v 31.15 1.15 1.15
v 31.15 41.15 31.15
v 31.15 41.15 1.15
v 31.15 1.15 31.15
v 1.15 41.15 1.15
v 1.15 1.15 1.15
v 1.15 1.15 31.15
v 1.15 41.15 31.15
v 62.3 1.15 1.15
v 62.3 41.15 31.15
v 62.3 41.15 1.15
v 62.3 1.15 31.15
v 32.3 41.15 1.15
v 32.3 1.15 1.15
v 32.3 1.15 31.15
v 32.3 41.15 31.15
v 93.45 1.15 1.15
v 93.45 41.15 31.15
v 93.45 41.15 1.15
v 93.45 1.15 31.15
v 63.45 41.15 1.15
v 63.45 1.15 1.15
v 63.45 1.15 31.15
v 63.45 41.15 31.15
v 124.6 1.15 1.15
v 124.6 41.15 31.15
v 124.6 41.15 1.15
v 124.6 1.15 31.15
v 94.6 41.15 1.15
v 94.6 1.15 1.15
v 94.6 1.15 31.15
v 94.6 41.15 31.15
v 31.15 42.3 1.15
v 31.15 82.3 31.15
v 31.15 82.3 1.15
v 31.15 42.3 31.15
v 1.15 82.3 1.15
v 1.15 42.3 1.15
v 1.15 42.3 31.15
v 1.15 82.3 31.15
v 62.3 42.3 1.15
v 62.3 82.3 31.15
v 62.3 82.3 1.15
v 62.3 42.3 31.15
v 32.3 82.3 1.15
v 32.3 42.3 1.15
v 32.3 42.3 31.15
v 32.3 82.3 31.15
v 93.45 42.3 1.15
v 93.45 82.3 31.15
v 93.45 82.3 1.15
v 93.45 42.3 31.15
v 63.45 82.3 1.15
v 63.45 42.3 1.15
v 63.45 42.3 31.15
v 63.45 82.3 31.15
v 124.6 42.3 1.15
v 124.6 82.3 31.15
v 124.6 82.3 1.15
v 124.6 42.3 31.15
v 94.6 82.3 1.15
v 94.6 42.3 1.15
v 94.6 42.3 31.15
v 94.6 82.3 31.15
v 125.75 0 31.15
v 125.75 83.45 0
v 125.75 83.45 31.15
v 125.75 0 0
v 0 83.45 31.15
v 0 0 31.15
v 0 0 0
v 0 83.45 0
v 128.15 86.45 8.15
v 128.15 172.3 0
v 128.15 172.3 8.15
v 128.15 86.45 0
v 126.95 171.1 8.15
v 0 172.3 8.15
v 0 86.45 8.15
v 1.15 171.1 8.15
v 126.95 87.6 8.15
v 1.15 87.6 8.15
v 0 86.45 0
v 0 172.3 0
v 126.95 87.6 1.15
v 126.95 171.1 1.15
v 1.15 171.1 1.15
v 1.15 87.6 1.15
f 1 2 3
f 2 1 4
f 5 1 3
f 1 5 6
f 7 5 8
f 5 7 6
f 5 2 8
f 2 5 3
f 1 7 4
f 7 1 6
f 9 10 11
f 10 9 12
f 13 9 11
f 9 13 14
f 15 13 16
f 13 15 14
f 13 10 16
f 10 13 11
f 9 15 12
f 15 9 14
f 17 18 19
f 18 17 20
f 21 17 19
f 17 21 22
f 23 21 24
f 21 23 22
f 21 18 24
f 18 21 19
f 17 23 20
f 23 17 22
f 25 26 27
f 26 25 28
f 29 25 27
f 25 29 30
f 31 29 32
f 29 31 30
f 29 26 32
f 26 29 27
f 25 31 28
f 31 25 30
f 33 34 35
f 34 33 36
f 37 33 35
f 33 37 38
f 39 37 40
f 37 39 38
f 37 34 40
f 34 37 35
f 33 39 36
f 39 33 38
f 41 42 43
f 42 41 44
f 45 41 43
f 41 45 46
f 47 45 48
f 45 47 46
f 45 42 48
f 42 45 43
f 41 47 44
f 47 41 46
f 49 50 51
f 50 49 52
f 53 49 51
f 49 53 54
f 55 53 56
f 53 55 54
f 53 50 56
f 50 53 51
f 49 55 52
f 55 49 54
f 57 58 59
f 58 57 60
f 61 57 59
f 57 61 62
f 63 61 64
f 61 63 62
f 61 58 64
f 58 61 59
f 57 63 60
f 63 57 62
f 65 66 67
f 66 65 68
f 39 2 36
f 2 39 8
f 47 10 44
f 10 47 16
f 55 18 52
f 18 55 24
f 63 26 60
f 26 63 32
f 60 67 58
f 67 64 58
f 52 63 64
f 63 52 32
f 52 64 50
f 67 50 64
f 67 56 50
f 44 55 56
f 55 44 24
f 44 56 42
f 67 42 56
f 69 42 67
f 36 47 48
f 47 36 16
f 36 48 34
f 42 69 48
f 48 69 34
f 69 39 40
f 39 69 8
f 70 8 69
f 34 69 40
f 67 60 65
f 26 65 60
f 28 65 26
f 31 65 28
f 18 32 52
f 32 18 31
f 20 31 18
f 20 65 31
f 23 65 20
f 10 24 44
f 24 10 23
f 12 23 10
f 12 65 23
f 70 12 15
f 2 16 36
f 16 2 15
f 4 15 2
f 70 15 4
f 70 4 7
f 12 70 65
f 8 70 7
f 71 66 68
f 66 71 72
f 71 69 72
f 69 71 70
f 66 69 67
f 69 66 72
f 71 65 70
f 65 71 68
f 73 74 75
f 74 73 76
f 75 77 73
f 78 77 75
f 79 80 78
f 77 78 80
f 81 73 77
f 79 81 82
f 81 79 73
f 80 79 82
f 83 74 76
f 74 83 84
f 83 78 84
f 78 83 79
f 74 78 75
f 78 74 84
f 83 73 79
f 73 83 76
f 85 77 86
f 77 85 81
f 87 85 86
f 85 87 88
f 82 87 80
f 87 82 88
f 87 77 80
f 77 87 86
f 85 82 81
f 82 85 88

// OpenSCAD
/* [Global] */


// Whether or not to generate the box
generate_box="yes";//[yes, no]

// Whether or not to generate the lid
generate_lid="yes";//[yes, no]

showlid = generate_lid=="yes"? true : false;

showbox = generate_box=="yes"? true : false;

Type_of_Lid = "Standard";//[Standard, Sliding]

lidtype = Type_of_Lid == "Standard"? 0 : 1;	// 0=Flat lid.  Use "1" for lid that slides off in the x direction


// Size of compartments, X
compx = 30;	


// Size of compartments, Y
compy = 40;	


// Width of wall, Make slightly larger then n*nozzle diameter. i.e. 1.15 for a 0.5 nozzle, should give a 2-pass thick wall
wall = 1.15;


// Number of compartments, X
nox = 4;


// Number of compartments, Y
noy = 2;



// Depth of compartments
deep = 30;	







// Tolerance around lid.  If it's too tight, increase this. If it's too loose, decrease it. 0.15 recommended for sliding lid
tolerance=.05;



// This is how far away from the box to print the lid
lidoffset=3;		


// How far the lid goes down the sides of the box. Only applies to Standard lid
lid_drop=7;
lidheight=lid_drop+wall;

//Adds a divit to sliding lid to make opening easer, no effect on standard lid
Thumb_Divit="yes"; //[yes, no]

includethumbhole = Thumb_Divit =="no"? false : true;


//Add a coin slot above every compartment
Coin_Slot="no"; //[yes, no]

includecoinslot=Coin_Slot == "no"? false: true;


//Size of Coin slot in X direction, default is slot thickness for United States Coins. Reverse X and Y to swap direction of slot
coinx=2.5;	
//Size of Coin slot in Y direction, default is slot width for United States Coins. Reverse X and Y to swap direction of slot
coiny=26;	



/* [Hidden] */

				// Z tolerance can be tweaked separately, to make the top of the sliding lid
				// be flush with the top of the box itself.  Default is zero.  Warning: this also
				// adds wiggle room to the lid.
                //Hidden from customizer, because more likely to mess up the box then help it.
ztolerance=0;

////////////////////
//start of objects
////////////////////

totalheight = deep + (lidtype*wall);
thumbrad = min(20,noy*(compy+wall)/3);

if (showbox) {
difference() {
	cube ( size = [nox * (compx + wall) + wall, noy * (compy + wall) + wall, (totalheight + wall)], center = false);


	for ( ybox = [ 0 : noy - 1])
		{
             for( xbox = [ 0 : nox - 1])
			{
			translate([ xbox * ( compx + wall ) + wall, ybox * ( compy + wall ) + wall, wall])
			cube ( size = [ compx, compy, totalheight+1 ]);
			}
		}
	if (lidtype==1) {
			translate ([0,wall/2,deep+wall]) 
			polyhedron ( points = [   
							[0,0,0], 
							[0,noy*(compy+wall),0], 
							[nox*(compx+wall)+wall/2,0,0], 
							[nox*(compx+wall)+wall/2,noy*(compy+wall),0],
							[0,wall/2,wall], 
							[0,noy*(compy+wall)-wall/2,wall], 
							[nox*(compx+wall)+wall/2,wall/2,wall], 
							[nox*(compx+wall)+wall/2,noy*(compy+wall)-wall/2,wall]
							],
						faces = [ 
							[0,2,1], [1,2,3], [4,5,6], [5,7,6]	,		// top and bottom
							[0,4,2], [4,6,2], [5,3,7], [5,1,3]	,		// angled sides
							[0,1,4], [1,5,4], [2,6,3], [3,6,7]			// trapezoidal ends
							]);
			translate ([0,wall/2,deep+wall-ztolerance])
			cube (size=[nox*(compx+wall)+wall/2,noy*(compy+wall),ztolerance],center=false);
			}

	}
}

if (showlid) {
translate ([0,noy*(compy+wall)+wall+lidoffset,0])
difference () { union () {	// for including coin slot
	if (lidtype==1) { 
		difference () {
		polyhedron ( points = [   
						[0,0,0], 
						[0,noy*(compy+wall)-2*tolerance,0], 
						[nox*(compx+wall)-tolerance+wall/2,0,0], 
						[nox*(compx+wall)-tolerance+wall/2,noy*(compy+wall)-2*tolerance,0],
						[0,wall/2,wall], 
						[0,noy*(compy+wall)-wall/2-2*tolerance,wall], 
						[nox*(compx+wall)-tolerance+wall/2,wall/2,wall], 
						[nox*(compx+wall)-tolerance+wall/2,noy*(compy+wall)-wall/2-2*tolerance,wall]
						],
					faces = [ 
						[0,2,1], [1,2,3], [4,5,6], [5,7,6]	,		// top and bottom
						[0,4,2], [4,6,2], [5,3,7], [5,1,3]	,		// angled sides
						[0,1,4], [1,5,4], [2,6,3], [3,6,7]			// trapezoidal ends
						]);
		// Thumb hole
		if (includethumbhole==true) {
			intersection () {
			translate ([min(8,nox*(compx+wall)/8),(noy*(compy+wall))/2,thumbrad+wall/2]) sphere (r=thumbrad, center=true, $fn=60);
			translate ([min(8,nox*(compx+wall)/8),0,0]) cube (size=[20,(noy*(compy+wall)),20], center=false);
		}
	}

		}
	} else {

	difference() {
	cube ( size = [nox * (compx + wall) + 3 * wall + 2* tolerance, noy * (compy + wall) + 3 * wall + 2*tolerance, lidheight], center = false);

	translate ([wall,wall,wall])
	cube ( size = [nox * (compx + wall) +wall+tolerance, noy * (compy + wall) + wall + tolerance, lidheight+1], center = false);
	}
} // if lidtype
} // union
if (includecoinslot==true) {
	for ( yslot = [ 0 : noy - 1])
		{
             for( xslot = [ 0 : nox - 1])
			{
			translate([ xslot * ( compx + wall ) + (2-lidtype)*wall + (compx-coinx)/2, yslot * ( compy + wall ) + wall*(2-3*lidtype/2) + (compy-coiny)/2, 0])
			cube ( size = [ coinx, coiny, wall ]);
			}
		}
	}
} //difference
} // if showlid
